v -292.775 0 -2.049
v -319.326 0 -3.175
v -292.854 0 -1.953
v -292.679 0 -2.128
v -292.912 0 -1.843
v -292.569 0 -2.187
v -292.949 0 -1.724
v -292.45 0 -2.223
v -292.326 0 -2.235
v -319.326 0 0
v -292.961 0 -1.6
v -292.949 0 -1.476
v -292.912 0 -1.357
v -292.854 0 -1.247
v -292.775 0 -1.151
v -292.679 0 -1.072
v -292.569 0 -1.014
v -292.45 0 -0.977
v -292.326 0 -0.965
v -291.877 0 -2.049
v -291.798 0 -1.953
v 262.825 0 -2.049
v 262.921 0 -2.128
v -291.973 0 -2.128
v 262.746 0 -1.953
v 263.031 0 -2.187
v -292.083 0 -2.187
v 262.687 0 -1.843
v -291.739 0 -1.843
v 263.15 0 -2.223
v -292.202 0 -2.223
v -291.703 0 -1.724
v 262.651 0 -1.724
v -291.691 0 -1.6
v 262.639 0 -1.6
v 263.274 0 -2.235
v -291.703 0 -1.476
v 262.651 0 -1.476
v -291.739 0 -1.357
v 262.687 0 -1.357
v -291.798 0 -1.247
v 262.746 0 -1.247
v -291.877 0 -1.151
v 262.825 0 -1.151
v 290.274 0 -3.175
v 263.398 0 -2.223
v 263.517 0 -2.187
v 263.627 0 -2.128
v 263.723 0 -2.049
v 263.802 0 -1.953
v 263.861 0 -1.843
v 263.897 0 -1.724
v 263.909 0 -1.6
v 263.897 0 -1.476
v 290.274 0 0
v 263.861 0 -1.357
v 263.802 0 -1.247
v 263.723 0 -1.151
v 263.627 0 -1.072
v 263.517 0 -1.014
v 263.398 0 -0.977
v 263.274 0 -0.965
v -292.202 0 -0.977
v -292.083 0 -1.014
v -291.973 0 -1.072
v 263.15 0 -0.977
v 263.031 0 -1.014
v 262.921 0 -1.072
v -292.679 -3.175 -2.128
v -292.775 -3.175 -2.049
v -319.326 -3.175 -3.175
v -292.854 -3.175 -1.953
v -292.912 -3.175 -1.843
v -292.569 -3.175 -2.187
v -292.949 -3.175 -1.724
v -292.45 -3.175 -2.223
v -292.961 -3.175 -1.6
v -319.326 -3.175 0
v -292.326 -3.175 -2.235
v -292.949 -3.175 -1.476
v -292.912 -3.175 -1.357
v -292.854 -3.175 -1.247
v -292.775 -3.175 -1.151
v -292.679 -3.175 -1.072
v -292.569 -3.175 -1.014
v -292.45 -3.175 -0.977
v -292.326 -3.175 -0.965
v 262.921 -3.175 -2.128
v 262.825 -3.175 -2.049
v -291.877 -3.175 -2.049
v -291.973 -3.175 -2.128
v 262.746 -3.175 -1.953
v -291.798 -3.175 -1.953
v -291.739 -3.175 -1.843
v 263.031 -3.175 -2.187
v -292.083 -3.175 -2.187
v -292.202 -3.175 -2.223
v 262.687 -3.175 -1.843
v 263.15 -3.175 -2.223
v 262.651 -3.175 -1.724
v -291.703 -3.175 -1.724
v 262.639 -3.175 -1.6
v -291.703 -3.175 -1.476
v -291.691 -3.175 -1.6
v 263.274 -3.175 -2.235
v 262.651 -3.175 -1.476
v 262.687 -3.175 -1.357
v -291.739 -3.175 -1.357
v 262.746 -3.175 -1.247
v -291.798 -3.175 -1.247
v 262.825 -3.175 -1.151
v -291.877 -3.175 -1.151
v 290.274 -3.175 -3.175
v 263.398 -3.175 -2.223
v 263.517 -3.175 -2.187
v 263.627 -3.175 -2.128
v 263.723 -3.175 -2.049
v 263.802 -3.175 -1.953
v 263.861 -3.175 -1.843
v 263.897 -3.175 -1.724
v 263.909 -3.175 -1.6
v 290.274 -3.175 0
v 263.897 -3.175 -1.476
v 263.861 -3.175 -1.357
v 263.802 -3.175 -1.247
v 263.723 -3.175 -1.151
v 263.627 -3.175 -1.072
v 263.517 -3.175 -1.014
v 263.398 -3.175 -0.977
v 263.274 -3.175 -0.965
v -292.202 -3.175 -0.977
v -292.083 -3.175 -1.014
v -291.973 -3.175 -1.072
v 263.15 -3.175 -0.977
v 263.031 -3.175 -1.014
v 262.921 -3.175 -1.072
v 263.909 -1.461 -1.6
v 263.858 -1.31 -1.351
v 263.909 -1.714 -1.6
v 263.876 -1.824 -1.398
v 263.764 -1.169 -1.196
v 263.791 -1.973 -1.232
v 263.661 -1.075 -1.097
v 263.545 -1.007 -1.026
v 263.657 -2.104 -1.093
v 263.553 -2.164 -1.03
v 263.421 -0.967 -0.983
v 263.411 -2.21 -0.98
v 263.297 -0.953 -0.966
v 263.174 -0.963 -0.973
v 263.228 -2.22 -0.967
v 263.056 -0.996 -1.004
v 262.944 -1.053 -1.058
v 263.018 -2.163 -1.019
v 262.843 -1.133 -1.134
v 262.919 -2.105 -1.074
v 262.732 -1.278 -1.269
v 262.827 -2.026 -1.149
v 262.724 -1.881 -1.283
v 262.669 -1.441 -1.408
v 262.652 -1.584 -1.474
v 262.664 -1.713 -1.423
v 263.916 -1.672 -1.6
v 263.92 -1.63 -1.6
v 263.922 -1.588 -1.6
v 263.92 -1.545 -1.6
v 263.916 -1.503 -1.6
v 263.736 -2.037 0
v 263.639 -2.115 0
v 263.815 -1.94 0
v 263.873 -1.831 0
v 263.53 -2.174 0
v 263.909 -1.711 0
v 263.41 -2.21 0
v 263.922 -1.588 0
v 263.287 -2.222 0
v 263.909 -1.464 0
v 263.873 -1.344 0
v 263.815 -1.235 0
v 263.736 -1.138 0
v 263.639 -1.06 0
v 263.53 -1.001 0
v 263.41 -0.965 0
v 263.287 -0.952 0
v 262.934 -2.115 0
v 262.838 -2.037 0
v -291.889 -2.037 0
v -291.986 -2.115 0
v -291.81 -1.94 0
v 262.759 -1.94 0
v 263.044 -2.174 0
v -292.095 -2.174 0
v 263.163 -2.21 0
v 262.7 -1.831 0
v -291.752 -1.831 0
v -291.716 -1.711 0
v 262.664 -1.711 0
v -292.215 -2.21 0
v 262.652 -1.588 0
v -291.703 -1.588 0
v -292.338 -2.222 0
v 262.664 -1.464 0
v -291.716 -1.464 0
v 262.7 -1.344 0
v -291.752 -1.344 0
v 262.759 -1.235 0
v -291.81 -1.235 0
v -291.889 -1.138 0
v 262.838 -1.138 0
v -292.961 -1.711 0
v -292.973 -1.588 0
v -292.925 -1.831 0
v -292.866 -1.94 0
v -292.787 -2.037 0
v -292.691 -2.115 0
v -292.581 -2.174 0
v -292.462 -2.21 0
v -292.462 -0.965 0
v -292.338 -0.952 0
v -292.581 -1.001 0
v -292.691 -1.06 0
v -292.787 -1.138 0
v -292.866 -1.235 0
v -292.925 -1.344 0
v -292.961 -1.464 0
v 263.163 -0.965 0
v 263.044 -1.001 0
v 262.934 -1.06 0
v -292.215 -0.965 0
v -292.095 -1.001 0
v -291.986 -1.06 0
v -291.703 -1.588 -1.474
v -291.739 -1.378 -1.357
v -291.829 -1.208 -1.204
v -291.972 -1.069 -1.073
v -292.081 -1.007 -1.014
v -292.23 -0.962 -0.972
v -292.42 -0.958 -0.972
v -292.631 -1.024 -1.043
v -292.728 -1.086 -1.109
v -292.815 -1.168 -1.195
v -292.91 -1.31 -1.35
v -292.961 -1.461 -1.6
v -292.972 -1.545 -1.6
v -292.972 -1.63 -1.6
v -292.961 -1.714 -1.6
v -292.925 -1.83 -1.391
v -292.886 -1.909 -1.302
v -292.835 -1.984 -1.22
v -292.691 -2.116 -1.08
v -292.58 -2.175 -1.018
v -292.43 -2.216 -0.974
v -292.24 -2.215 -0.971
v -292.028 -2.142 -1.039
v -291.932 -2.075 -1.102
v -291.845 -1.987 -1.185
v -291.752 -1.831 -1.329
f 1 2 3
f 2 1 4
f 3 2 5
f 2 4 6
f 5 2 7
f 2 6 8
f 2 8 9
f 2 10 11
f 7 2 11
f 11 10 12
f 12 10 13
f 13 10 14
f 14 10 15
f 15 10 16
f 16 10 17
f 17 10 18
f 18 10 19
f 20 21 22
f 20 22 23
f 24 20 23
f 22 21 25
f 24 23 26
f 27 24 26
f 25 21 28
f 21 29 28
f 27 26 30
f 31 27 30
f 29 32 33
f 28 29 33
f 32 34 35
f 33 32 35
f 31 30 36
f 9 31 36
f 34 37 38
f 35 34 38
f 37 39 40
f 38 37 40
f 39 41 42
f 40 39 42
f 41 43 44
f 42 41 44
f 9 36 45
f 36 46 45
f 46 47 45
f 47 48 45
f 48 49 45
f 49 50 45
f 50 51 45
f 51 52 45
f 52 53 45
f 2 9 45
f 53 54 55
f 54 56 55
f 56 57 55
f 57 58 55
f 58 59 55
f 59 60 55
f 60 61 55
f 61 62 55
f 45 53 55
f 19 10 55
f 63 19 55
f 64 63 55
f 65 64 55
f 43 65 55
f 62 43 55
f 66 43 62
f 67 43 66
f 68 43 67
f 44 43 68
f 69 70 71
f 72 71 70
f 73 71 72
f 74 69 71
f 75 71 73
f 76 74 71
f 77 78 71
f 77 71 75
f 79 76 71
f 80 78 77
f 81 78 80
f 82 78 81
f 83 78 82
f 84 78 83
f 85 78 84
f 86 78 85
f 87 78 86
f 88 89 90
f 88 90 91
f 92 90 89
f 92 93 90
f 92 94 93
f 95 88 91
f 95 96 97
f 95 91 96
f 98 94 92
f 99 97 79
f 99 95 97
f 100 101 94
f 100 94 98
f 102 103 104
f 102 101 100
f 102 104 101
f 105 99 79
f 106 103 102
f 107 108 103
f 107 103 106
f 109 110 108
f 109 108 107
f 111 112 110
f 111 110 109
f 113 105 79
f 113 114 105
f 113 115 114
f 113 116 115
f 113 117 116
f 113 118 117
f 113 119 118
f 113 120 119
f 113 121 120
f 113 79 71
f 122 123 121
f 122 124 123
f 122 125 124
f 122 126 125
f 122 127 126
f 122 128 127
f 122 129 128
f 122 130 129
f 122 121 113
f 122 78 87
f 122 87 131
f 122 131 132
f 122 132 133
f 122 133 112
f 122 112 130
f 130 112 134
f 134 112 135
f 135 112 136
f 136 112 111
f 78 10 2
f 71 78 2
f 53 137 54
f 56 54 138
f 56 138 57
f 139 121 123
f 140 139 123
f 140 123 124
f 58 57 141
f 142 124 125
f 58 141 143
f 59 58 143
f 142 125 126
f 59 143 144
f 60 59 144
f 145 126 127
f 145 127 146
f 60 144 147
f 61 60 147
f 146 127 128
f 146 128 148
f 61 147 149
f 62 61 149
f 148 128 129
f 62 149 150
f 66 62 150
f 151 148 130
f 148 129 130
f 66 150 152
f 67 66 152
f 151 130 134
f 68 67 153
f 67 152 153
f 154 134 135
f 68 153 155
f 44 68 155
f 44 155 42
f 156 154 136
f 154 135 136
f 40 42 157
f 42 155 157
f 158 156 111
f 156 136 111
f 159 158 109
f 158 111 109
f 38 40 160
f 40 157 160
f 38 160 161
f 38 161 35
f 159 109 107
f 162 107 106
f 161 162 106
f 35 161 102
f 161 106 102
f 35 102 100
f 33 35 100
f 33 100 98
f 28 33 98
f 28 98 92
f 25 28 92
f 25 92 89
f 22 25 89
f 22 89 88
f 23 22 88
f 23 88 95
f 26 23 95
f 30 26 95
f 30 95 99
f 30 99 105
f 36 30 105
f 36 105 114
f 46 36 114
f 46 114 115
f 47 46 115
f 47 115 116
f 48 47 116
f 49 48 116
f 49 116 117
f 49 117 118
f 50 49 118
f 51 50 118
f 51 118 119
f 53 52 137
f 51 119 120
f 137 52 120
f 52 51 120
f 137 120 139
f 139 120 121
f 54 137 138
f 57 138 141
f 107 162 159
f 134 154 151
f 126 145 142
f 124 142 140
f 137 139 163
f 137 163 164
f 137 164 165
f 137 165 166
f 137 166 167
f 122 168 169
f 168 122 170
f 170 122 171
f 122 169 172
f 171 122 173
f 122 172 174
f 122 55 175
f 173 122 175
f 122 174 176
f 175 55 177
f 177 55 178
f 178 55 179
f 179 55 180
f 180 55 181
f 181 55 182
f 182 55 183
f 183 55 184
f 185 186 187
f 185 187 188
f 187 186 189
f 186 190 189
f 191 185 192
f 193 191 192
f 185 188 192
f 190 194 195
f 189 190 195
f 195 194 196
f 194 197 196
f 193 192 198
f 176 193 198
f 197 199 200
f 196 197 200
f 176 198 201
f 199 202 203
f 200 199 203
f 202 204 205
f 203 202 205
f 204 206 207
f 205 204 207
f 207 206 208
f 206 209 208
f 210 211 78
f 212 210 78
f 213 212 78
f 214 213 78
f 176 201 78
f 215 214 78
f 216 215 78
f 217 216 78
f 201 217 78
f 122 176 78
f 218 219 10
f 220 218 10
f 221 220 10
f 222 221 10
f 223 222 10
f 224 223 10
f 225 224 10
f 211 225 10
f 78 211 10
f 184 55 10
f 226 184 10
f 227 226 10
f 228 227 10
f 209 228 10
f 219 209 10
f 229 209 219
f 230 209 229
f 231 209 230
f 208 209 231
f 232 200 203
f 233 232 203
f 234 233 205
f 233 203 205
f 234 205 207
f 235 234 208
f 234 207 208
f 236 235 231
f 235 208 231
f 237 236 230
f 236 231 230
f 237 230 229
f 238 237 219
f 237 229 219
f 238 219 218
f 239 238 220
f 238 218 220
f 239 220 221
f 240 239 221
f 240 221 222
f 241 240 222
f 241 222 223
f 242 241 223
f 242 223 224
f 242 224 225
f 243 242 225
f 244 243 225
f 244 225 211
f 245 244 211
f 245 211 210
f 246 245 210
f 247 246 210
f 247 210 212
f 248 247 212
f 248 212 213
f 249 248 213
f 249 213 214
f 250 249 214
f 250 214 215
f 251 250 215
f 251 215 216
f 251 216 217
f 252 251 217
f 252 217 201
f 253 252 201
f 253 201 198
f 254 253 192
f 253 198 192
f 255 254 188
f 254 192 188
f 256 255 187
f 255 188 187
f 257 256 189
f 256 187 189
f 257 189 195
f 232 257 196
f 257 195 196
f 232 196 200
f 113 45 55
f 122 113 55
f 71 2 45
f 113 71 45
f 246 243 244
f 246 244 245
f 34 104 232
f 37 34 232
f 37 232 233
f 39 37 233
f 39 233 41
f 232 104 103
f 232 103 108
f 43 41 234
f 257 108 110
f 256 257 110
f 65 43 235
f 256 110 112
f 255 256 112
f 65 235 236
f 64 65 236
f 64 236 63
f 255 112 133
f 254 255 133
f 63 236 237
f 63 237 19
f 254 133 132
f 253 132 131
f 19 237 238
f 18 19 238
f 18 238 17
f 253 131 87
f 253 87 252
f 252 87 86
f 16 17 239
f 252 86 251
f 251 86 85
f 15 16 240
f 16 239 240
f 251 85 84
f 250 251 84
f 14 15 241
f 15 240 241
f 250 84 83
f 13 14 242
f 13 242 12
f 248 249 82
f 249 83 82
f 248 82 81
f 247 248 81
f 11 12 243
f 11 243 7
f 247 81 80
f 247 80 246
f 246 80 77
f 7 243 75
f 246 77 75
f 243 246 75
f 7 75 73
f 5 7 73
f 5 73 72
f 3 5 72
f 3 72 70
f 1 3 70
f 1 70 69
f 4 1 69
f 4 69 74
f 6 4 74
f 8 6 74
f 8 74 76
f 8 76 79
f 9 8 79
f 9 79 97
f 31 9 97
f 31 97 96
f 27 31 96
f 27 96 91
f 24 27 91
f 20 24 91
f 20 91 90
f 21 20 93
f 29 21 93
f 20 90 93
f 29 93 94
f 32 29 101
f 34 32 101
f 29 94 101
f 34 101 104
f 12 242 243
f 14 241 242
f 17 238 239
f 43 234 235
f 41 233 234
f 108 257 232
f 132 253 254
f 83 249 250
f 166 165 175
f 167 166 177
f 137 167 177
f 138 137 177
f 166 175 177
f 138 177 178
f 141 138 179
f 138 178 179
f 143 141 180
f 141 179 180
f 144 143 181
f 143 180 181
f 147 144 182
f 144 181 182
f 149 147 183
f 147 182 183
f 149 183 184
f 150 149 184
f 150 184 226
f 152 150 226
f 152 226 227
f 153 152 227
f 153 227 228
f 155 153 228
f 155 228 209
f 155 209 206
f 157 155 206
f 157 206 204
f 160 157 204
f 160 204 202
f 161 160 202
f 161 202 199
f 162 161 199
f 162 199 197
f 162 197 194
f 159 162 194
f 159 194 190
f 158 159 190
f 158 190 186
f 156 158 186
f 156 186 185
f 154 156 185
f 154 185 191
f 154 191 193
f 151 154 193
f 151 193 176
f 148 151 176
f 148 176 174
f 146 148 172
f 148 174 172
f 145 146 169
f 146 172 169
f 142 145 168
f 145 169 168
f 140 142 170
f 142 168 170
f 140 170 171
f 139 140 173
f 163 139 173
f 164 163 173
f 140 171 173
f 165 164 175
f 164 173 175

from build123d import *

# Parameters (mm, degrees)
F1_DEPTH = 3.175
F2_R     = 0.635
F3_DEPTH = 1.6002
F4_R     = 0.635
F5_DEPTH = 25.4


with BuildPart() as f1:
    # F0 (on Front) → F1 (new body)
    with BuildSketch(Plane.XZ):
        Polygon((-319.325916, 0), (-319.325916, -3.175), (-293.925916, -3.175), (264.874084, -3.175), (290.274084, -3.175), (290.274084, 0), align=None)
    extrude(amount=F1_DEPTH)

    # F2 (on Top) → F3 (cut)
    with BuildSketch(Plane.XY):
        with Locations((-292.338416, -1.5875)):
            Circle(F2_R)
        with Locations((263.286584, -1.5875)):
            Circle(F2_R)
    extrude(amount=-F3_DEPTH, mode=Mode.SUBTRACT)

    # F4 (on face) → F5 (cut)
    with BuildSketch(Plane.XZ.offset(3.175)):
        with Locations((-292.325716, -1.6002)):
            Circle(F4_R)
        with Locations((263.273884, -1.6002)):
            Circle(F4_R)
    extrude(amount=-F5_DEPTH, mode=Mode.SUBTRACT)


solid = f1.part
